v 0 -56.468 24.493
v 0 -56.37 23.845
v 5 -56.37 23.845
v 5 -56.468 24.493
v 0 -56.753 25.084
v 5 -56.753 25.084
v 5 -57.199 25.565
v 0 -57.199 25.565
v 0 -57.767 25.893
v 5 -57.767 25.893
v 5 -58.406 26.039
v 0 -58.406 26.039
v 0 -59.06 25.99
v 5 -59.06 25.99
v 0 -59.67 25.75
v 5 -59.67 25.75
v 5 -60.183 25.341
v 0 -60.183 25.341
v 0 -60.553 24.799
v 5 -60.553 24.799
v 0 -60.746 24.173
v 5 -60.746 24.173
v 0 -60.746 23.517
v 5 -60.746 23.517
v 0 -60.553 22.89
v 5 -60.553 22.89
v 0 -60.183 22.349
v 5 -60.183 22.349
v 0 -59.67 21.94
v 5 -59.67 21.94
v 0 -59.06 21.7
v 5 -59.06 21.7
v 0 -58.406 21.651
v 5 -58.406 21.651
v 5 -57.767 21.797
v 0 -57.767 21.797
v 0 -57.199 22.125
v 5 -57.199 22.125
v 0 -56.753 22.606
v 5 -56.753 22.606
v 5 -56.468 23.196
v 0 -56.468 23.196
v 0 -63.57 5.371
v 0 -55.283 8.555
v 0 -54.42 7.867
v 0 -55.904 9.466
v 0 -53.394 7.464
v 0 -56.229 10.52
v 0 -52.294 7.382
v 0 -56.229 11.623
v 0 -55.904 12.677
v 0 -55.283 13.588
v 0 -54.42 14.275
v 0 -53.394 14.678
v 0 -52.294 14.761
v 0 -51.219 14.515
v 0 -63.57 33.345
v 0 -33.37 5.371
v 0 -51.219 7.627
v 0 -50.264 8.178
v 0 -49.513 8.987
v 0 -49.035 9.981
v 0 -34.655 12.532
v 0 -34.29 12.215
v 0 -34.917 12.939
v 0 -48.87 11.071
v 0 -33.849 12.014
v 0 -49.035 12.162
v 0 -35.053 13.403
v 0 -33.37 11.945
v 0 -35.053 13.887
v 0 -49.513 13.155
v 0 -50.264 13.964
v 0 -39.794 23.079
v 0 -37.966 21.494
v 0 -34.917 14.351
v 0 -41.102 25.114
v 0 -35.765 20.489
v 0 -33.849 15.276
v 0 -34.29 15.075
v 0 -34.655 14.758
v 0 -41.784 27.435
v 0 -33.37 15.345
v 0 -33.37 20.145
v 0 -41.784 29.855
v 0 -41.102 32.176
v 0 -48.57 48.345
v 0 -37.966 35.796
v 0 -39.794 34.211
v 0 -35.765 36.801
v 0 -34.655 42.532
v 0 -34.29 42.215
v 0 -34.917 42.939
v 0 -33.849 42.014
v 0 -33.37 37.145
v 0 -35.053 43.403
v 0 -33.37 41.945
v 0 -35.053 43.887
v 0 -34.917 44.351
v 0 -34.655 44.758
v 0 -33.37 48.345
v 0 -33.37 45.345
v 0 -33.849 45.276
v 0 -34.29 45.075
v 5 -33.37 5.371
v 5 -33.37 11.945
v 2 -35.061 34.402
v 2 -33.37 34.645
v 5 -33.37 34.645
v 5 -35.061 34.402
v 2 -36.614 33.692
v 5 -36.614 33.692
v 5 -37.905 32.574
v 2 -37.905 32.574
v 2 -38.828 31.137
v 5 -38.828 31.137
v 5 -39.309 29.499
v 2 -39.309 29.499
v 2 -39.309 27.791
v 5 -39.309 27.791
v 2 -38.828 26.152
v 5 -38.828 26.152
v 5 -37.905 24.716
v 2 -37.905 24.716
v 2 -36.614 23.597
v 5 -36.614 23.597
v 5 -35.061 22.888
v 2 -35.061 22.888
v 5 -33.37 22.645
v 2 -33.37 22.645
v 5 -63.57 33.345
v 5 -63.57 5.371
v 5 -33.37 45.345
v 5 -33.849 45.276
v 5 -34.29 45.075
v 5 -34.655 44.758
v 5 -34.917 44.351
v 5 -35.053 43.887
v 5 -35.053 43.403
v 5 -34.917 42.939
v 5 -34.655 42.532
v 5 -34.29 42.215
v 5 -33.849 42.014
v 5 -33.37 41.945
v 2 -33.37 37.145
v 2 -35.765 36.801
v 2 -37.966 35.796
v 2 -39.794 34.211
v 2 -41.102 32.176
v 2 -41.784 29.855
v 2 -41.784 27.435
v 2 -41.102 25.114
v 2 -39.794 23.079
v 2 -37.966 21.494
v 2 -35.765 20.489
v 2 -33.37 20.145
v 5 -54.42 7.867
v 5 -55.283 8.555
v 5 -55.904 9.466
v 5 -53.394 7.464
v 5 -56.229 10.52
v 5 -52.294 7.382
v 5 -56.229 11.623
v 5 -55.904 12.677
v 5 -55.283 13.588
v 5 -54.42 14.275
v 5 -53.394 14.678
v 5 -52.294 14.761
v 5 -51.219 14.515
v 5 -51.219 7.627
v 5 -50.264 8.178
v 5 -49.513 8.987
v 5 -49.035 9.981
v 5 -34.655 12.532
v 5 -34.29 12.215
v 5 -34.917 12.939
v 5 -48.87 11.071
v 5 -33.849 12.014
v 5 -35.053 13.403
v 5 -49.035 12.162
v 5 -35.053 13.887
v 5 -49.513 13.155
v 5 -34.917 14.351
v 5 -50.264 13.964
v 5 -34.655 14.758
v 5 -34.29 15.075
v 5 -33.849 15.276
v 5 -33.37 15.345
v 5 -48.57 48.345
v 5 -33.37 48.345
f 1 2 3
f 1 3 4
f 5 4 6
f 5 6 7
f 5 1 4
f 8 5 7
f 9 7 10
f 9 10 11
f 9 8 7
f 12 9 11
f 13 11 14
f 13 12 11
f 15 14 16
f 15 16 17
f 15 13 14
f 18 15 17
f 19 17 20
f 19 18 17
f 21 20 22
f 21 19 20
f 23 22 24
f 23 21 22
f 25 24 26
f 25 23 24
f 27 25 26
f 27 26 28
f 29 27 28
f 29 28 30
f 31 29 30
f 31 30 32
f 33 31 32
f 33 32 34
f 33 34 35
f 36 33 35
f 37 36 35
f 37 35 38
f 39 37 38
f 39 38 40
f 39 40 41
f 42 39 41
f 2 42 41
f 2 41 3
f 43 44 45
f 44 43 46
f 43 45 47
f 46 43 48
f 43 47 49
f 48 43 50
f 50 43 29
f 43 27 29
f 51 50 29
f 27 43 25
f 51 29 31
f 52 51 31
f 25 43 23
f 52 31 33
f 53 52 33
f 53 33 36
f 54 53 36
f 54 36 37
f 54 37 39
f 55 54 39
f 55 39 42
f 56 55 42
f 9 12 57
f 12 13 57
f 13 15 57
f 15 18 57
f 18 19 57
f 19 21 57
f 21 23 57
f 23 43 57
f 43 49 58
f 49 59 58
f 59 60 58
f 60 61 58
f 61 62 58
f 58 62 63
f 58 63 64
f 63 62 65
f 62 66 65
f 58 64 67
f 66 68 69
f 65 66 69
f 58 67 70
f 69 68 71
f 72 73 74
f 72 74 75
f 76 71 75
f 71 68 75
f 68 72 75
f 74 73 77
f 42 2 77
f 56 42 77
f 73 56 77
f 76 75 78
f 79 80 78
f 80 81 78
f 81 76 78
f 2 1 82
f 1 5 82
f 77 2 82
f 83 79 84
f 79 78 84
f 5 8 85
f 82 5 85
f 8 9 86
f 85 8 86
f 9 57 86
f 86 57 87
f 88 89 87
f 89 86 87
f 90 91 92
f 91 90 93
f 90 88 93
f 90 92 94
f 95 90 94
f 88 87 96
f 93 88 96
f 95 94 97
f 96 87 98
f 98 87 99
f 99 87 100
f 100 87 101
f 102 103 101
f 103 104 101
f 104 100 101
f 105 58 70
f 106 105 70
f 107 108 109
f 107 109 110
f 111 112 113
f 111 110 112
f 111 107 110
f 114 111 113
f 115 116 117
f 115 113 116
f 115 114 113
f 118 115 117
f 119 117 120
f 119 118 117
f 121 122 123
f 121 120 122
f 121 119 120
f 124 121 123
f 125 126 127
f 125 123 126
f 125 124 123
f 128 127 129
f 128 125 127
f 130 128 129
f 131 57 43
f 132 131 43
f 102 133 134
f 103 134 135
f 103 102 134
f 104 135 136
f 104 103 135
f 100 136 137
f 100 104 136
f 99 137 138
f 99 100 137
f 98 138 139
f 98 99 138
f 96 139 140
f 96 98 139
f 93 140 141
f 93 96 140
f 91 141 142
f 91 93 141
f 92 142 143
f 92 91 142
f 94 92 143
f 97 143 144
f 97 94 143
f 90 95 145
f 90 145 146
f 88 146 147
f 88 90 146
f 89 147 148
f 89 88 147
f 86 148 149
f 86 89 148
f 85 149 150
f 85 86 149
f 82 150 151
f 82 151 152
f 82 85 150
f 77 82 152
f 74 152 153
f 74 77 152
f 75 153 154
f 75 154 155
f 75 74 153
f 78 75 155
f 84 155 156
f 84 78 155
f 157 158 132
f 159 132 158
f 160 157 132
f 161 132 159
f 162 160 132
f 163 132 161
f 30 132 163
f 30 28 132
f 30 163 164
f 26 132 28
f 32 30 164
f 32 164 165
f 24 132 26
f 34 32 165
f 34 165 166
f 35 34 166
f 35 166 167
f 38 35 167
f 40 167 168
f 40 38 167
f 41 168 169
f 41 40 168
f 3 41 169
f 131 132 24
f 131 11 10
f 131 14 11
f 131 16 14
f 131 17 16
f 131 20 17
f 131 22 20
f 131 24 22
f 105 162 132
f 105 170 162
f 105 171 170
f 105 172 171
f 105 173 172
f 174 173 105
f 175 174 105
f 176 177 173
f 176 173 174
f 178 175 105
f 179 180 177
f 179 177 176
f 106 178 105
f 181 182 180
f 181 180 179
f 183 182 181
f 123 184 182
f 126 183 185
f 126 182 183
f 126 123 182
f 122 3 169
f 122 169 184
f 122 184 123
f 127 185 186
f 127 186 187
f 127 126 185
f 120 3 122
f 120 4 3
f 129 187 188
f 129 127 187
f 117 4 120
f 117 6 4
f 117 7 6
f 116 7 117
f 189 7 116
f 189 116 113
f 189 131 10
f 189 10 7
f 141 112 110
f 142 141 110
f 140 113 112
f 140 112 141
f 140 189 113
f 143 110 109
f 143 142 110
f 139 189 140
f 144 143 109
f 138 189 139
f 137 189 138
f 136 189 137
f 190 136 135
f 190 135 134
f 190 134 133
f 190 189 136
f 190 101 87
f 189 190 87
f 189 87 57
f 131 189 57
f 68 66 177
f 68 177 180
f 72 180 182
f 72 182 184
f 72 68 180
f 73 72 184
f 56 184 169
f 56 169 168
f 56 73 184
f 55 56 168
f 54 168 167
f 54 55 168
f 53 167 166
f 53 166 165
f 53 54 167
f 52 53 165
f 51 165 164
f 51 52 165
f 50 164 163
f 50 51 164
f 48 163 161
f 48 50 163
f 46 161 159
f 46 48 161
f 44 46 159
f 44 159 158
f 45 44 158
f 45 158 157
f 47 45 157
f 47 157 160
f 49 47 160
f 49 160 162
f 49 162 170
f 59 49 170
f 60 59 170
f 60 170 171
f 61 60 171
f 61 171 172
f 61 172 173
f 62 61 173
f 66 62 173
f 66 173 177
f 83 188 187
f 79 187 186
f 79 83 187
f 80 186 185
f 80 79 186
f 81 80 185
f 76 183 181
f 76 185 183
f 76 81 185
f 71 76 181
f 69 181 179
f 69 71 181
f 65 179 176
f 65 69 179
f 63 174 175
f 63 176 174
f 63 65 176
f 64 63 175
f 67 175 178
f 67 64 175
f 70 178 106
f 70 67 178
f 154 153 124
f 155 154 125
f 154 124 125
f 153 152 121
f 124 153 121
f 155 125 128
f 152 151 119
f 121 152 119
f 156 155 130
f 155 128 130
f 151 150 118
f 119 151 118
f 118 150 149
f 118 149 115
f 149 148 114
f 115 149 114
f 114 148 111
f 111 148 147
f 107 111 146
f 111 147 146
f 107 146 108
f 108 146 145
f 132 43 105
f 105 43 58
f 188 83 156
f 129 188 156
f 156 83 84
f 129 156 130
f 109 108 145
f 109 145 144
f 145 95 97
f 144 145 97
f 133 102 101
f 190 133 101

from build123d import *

# Parameters (mm, degrees)
F0_R     = 3.7
F0_R_2   = 2.2
F1_DEPTH = 5
F2_DEPTH = 3
F3_DEPTH = 3
F5_DEPTH = 2


# Not quite as in the source:
# - a feature of the source that left no trace in its solid (it failed there, or was rolled back) is left out


with BuildPart() as f1:
    # F0 (on Right) → F1 (new body)
    with BuildSketch(Plane.YZ):
        with BuildLine():
            Line((-63.5704365752, 33.3448962937), (-63.5704365752, 5.3711892086))
            Line((-63.5704365752, 5.3711892086), (-33.3704365752, 5.3711892086))
            Line((-33.3704365752, 5.3711892086), (-33.3704365752, 11.9448962937))
            ThreePointArc((-33.3704365752, 11.9448962937), (-35.0704365752, 13.6448962937), (-33.3704365752, 15.3448962937))
            Line((-33.3704365752, 15.3448962937), (-33.3704365752, 20.1448962937))
            ThreePointArc((-33.3704365752, 20.1448962937), (-41.8704365752, 28.6448962937), (-33.3704365752, 37.1448962937))
            Line((-33.3704365752, 37.1448962937), (-33.3704365752, 41.9448962937))
            ThreePointArc((-33.3704365752, 41.9448962937), (-35.0704365752, 43.6448962937), (-33.3704365752, 45.3448962937))
            Line((-33.3704365752, 45.3448962937), (-33.3704365752, 48.3448962937))
            Line((-33.3704365752, 48.3448962937), (-48.5704365752, 48.3448962937))
            Line((-48.5704365752, 48.3448962937), (-63.5704365752, 33.3448962937))
        make_face()
        with Locations((-52.5704365752, 11.0711892086)):
            Circle(F0_R, mode=Mode.SUBTRACT)
        with Locations((-58.5704365752, 23.8448962937)):
            Circle(F0_R_2, mode=Mode.SUBTRACT)
        with BuildLine():
            ThreePointArc((-33.3704365752, 37.1448962937), (-41.8704365752, 28.6448962937), (-33.3704365752, 20.1448962937))
            Line((-33.3704365752, 20.1448962937), (-33.3704365752, 22.6448962937))
            ThreePointArc((-33.3704365752, 22.6448962937), (-39.3704365752, 28.6448962937), (-33.3704365752, 34.6448962937))
            Line((-33.3704365752, 34.6448962937), (-33.3704365752, 37.1448962937))
        make_face()
    extrude(amount=F1_DEPTH)

    # F0 (on Right) → F2 (join)
    with BuildSketch(Plane.YZ):
        with BuildLine():
            Line((-63.5704365752, 33.3448962937), (-63.5704365752, 5.3711892086))
            Line((-63.5704365752, 5.3711892086), (-33.3704365752, 5.3711892086))
            Line((-33.3704365752, 5.3711892086), (-33.3704365752, 11.9448962937))
            ThreePointArc((-33.3704365752, 11.9448962937), (-35.0704365752, 13.6448962937), (-33.3704365752, 15.3448962937))
            Line((-33.3704365752, 15.3448962937), (-33.3704365752, 20.1448962937))
            ThreePointArc((-33.3704365752, 20.1448962937), (-41.8704365752, 28.6448962937), (-33.3704365752, 37.1448962937))
            Line((-33.3704365752, 37.1448962937), (-33.3704365752, 41.9448962937))
            ThreePointArc((-33.3704365752, 41.9448962937), (-35.0704365752, 43.6448962937), (-33.3704365752, 45.3448962937))
            Line((-33.3704365752, 45.3448962937), (-33.3704365752, 48.3448962937))
            Line((-33.3704365752, 48.3448962937), (-48.5704365752, 48.3448962937))
            Line((-48.5704365752, 48.3448962937), (-63.5704365752, 33.3448962937))
        make_face()
        with Locations((-52.5704365752, 11.0711892086)):
            Circle(F0_R, mode=Mode.SUBTRACT)
        with Locations((-58.5704365752, 23.8448962937)):
            Circle(F0_R_2, mode=Mode.SUBTRACT)
        with BuildLine():
            ThreePointArc((-33.3704365752, 15.3448962937), (-35.0704365752, 13.6448962937), (-33.3704365752, 11.9448962937))
            Line((-33.3704365752, 11.9448962937), (-33.3704365752, 15.3448962937))
        make_face()
        with BuildLine():
            ThreePointArc((-33.3704365752, 37.1448962937), (-41.8704365752, 28.6448962937), (-33.3704365752, 20.1448962937))
            Line((-33.3704365752, 20.1448962937), (-33.3704365752, 22.6448962937))
            ThreePointArc((-33.3704365752, 22.6448962937), (-39.3704365752, 28.6448962937), (-33.3704365752, 34.6448962937))
            Line((-33.3704365752, 34.6448962937), (-33.3704365752, 37.1448962937))
        make_face()
        with BuildLine():
            Line((-33.3704365752, 41.9448962937), (-33.3704365752, 45.3448962937))
            ThreePointArc((-33.3704365752, 45.3448962937), (-35.0704365752, 43.6448962937), (-33.3704365752, 41.9448962937))
        make_face()
        with BuildLine():
            ThreePointArc((-33.3704365752, 34.6448962937), (-39.3704365752, 28.6448962937), (-33.3704365752, 22.6448962937))
            Line((-33.3704365752, 22.6448962937), (-33.3704365752, 34.6448962937))
        make_face()
    extrude(amount=F2_DEPTH)

    # F0 (on Right) → F3 (cut, through all)
    with BuildSketch(Plane.YZ):
        with BuildLine():
            ThreePointArc((-33.3704365752, 34.6448962937), (-39.3704365752, 28.6448962937), (-33.3704365752, 22.6448962937))
            Line((-33.3704365752, 22.6448962937), (-33.3704365752, 34.6448962937))
        make_face()
        with BuildLine():
            Line((-33.3704365752, 41.9448962937), (-33.3704365752, 45.3448962937))
            ThreePointArc((-33.3704365752, 45.3448962937), (-35.0704365752, 43.6448962937), (-33.3704365752, 41.9448962937))
        make_face()
        with BuildLine():
            ThreePointArc((-33.3704365752, 15.3448962937), (-35.0704365752, 13.6448962937), (-33.3704365752, 11.9448962937))
            Line((-33.3704365752, 11.9448962937), (-33.3704365752, 15.3448962937))
        make_face()
    extrude(amount=F3_DEPTH, mode=Mode.SUBTRACT)

    # F0 (on Right) → F5 (cut)
    with BuildSketch(Plane.YZ):
        with BuildLine():
            ThreePointArc((-33.3704365752, 37.1448962937), (-41.8704365752, 28.6448962937), (-33.3704365752, 20.1448962937))
            Line((-33.3704365752, 20.1448962937), (-33.3704365752, 22.6448962937))
            ThreePointArc((-33.3704365752, 22.6448962937), (-39.3704365752, 28.6448962937), (-33.3704365752, 34.6448962937))
            Line((-33.3704365752, 34.6448962937), (-33.3704365752, 37.1448962937))
        make_face()
    extrude(amount=F5_DEPTH, mode=Mode.SUBTRACT)


solid = f1.part
